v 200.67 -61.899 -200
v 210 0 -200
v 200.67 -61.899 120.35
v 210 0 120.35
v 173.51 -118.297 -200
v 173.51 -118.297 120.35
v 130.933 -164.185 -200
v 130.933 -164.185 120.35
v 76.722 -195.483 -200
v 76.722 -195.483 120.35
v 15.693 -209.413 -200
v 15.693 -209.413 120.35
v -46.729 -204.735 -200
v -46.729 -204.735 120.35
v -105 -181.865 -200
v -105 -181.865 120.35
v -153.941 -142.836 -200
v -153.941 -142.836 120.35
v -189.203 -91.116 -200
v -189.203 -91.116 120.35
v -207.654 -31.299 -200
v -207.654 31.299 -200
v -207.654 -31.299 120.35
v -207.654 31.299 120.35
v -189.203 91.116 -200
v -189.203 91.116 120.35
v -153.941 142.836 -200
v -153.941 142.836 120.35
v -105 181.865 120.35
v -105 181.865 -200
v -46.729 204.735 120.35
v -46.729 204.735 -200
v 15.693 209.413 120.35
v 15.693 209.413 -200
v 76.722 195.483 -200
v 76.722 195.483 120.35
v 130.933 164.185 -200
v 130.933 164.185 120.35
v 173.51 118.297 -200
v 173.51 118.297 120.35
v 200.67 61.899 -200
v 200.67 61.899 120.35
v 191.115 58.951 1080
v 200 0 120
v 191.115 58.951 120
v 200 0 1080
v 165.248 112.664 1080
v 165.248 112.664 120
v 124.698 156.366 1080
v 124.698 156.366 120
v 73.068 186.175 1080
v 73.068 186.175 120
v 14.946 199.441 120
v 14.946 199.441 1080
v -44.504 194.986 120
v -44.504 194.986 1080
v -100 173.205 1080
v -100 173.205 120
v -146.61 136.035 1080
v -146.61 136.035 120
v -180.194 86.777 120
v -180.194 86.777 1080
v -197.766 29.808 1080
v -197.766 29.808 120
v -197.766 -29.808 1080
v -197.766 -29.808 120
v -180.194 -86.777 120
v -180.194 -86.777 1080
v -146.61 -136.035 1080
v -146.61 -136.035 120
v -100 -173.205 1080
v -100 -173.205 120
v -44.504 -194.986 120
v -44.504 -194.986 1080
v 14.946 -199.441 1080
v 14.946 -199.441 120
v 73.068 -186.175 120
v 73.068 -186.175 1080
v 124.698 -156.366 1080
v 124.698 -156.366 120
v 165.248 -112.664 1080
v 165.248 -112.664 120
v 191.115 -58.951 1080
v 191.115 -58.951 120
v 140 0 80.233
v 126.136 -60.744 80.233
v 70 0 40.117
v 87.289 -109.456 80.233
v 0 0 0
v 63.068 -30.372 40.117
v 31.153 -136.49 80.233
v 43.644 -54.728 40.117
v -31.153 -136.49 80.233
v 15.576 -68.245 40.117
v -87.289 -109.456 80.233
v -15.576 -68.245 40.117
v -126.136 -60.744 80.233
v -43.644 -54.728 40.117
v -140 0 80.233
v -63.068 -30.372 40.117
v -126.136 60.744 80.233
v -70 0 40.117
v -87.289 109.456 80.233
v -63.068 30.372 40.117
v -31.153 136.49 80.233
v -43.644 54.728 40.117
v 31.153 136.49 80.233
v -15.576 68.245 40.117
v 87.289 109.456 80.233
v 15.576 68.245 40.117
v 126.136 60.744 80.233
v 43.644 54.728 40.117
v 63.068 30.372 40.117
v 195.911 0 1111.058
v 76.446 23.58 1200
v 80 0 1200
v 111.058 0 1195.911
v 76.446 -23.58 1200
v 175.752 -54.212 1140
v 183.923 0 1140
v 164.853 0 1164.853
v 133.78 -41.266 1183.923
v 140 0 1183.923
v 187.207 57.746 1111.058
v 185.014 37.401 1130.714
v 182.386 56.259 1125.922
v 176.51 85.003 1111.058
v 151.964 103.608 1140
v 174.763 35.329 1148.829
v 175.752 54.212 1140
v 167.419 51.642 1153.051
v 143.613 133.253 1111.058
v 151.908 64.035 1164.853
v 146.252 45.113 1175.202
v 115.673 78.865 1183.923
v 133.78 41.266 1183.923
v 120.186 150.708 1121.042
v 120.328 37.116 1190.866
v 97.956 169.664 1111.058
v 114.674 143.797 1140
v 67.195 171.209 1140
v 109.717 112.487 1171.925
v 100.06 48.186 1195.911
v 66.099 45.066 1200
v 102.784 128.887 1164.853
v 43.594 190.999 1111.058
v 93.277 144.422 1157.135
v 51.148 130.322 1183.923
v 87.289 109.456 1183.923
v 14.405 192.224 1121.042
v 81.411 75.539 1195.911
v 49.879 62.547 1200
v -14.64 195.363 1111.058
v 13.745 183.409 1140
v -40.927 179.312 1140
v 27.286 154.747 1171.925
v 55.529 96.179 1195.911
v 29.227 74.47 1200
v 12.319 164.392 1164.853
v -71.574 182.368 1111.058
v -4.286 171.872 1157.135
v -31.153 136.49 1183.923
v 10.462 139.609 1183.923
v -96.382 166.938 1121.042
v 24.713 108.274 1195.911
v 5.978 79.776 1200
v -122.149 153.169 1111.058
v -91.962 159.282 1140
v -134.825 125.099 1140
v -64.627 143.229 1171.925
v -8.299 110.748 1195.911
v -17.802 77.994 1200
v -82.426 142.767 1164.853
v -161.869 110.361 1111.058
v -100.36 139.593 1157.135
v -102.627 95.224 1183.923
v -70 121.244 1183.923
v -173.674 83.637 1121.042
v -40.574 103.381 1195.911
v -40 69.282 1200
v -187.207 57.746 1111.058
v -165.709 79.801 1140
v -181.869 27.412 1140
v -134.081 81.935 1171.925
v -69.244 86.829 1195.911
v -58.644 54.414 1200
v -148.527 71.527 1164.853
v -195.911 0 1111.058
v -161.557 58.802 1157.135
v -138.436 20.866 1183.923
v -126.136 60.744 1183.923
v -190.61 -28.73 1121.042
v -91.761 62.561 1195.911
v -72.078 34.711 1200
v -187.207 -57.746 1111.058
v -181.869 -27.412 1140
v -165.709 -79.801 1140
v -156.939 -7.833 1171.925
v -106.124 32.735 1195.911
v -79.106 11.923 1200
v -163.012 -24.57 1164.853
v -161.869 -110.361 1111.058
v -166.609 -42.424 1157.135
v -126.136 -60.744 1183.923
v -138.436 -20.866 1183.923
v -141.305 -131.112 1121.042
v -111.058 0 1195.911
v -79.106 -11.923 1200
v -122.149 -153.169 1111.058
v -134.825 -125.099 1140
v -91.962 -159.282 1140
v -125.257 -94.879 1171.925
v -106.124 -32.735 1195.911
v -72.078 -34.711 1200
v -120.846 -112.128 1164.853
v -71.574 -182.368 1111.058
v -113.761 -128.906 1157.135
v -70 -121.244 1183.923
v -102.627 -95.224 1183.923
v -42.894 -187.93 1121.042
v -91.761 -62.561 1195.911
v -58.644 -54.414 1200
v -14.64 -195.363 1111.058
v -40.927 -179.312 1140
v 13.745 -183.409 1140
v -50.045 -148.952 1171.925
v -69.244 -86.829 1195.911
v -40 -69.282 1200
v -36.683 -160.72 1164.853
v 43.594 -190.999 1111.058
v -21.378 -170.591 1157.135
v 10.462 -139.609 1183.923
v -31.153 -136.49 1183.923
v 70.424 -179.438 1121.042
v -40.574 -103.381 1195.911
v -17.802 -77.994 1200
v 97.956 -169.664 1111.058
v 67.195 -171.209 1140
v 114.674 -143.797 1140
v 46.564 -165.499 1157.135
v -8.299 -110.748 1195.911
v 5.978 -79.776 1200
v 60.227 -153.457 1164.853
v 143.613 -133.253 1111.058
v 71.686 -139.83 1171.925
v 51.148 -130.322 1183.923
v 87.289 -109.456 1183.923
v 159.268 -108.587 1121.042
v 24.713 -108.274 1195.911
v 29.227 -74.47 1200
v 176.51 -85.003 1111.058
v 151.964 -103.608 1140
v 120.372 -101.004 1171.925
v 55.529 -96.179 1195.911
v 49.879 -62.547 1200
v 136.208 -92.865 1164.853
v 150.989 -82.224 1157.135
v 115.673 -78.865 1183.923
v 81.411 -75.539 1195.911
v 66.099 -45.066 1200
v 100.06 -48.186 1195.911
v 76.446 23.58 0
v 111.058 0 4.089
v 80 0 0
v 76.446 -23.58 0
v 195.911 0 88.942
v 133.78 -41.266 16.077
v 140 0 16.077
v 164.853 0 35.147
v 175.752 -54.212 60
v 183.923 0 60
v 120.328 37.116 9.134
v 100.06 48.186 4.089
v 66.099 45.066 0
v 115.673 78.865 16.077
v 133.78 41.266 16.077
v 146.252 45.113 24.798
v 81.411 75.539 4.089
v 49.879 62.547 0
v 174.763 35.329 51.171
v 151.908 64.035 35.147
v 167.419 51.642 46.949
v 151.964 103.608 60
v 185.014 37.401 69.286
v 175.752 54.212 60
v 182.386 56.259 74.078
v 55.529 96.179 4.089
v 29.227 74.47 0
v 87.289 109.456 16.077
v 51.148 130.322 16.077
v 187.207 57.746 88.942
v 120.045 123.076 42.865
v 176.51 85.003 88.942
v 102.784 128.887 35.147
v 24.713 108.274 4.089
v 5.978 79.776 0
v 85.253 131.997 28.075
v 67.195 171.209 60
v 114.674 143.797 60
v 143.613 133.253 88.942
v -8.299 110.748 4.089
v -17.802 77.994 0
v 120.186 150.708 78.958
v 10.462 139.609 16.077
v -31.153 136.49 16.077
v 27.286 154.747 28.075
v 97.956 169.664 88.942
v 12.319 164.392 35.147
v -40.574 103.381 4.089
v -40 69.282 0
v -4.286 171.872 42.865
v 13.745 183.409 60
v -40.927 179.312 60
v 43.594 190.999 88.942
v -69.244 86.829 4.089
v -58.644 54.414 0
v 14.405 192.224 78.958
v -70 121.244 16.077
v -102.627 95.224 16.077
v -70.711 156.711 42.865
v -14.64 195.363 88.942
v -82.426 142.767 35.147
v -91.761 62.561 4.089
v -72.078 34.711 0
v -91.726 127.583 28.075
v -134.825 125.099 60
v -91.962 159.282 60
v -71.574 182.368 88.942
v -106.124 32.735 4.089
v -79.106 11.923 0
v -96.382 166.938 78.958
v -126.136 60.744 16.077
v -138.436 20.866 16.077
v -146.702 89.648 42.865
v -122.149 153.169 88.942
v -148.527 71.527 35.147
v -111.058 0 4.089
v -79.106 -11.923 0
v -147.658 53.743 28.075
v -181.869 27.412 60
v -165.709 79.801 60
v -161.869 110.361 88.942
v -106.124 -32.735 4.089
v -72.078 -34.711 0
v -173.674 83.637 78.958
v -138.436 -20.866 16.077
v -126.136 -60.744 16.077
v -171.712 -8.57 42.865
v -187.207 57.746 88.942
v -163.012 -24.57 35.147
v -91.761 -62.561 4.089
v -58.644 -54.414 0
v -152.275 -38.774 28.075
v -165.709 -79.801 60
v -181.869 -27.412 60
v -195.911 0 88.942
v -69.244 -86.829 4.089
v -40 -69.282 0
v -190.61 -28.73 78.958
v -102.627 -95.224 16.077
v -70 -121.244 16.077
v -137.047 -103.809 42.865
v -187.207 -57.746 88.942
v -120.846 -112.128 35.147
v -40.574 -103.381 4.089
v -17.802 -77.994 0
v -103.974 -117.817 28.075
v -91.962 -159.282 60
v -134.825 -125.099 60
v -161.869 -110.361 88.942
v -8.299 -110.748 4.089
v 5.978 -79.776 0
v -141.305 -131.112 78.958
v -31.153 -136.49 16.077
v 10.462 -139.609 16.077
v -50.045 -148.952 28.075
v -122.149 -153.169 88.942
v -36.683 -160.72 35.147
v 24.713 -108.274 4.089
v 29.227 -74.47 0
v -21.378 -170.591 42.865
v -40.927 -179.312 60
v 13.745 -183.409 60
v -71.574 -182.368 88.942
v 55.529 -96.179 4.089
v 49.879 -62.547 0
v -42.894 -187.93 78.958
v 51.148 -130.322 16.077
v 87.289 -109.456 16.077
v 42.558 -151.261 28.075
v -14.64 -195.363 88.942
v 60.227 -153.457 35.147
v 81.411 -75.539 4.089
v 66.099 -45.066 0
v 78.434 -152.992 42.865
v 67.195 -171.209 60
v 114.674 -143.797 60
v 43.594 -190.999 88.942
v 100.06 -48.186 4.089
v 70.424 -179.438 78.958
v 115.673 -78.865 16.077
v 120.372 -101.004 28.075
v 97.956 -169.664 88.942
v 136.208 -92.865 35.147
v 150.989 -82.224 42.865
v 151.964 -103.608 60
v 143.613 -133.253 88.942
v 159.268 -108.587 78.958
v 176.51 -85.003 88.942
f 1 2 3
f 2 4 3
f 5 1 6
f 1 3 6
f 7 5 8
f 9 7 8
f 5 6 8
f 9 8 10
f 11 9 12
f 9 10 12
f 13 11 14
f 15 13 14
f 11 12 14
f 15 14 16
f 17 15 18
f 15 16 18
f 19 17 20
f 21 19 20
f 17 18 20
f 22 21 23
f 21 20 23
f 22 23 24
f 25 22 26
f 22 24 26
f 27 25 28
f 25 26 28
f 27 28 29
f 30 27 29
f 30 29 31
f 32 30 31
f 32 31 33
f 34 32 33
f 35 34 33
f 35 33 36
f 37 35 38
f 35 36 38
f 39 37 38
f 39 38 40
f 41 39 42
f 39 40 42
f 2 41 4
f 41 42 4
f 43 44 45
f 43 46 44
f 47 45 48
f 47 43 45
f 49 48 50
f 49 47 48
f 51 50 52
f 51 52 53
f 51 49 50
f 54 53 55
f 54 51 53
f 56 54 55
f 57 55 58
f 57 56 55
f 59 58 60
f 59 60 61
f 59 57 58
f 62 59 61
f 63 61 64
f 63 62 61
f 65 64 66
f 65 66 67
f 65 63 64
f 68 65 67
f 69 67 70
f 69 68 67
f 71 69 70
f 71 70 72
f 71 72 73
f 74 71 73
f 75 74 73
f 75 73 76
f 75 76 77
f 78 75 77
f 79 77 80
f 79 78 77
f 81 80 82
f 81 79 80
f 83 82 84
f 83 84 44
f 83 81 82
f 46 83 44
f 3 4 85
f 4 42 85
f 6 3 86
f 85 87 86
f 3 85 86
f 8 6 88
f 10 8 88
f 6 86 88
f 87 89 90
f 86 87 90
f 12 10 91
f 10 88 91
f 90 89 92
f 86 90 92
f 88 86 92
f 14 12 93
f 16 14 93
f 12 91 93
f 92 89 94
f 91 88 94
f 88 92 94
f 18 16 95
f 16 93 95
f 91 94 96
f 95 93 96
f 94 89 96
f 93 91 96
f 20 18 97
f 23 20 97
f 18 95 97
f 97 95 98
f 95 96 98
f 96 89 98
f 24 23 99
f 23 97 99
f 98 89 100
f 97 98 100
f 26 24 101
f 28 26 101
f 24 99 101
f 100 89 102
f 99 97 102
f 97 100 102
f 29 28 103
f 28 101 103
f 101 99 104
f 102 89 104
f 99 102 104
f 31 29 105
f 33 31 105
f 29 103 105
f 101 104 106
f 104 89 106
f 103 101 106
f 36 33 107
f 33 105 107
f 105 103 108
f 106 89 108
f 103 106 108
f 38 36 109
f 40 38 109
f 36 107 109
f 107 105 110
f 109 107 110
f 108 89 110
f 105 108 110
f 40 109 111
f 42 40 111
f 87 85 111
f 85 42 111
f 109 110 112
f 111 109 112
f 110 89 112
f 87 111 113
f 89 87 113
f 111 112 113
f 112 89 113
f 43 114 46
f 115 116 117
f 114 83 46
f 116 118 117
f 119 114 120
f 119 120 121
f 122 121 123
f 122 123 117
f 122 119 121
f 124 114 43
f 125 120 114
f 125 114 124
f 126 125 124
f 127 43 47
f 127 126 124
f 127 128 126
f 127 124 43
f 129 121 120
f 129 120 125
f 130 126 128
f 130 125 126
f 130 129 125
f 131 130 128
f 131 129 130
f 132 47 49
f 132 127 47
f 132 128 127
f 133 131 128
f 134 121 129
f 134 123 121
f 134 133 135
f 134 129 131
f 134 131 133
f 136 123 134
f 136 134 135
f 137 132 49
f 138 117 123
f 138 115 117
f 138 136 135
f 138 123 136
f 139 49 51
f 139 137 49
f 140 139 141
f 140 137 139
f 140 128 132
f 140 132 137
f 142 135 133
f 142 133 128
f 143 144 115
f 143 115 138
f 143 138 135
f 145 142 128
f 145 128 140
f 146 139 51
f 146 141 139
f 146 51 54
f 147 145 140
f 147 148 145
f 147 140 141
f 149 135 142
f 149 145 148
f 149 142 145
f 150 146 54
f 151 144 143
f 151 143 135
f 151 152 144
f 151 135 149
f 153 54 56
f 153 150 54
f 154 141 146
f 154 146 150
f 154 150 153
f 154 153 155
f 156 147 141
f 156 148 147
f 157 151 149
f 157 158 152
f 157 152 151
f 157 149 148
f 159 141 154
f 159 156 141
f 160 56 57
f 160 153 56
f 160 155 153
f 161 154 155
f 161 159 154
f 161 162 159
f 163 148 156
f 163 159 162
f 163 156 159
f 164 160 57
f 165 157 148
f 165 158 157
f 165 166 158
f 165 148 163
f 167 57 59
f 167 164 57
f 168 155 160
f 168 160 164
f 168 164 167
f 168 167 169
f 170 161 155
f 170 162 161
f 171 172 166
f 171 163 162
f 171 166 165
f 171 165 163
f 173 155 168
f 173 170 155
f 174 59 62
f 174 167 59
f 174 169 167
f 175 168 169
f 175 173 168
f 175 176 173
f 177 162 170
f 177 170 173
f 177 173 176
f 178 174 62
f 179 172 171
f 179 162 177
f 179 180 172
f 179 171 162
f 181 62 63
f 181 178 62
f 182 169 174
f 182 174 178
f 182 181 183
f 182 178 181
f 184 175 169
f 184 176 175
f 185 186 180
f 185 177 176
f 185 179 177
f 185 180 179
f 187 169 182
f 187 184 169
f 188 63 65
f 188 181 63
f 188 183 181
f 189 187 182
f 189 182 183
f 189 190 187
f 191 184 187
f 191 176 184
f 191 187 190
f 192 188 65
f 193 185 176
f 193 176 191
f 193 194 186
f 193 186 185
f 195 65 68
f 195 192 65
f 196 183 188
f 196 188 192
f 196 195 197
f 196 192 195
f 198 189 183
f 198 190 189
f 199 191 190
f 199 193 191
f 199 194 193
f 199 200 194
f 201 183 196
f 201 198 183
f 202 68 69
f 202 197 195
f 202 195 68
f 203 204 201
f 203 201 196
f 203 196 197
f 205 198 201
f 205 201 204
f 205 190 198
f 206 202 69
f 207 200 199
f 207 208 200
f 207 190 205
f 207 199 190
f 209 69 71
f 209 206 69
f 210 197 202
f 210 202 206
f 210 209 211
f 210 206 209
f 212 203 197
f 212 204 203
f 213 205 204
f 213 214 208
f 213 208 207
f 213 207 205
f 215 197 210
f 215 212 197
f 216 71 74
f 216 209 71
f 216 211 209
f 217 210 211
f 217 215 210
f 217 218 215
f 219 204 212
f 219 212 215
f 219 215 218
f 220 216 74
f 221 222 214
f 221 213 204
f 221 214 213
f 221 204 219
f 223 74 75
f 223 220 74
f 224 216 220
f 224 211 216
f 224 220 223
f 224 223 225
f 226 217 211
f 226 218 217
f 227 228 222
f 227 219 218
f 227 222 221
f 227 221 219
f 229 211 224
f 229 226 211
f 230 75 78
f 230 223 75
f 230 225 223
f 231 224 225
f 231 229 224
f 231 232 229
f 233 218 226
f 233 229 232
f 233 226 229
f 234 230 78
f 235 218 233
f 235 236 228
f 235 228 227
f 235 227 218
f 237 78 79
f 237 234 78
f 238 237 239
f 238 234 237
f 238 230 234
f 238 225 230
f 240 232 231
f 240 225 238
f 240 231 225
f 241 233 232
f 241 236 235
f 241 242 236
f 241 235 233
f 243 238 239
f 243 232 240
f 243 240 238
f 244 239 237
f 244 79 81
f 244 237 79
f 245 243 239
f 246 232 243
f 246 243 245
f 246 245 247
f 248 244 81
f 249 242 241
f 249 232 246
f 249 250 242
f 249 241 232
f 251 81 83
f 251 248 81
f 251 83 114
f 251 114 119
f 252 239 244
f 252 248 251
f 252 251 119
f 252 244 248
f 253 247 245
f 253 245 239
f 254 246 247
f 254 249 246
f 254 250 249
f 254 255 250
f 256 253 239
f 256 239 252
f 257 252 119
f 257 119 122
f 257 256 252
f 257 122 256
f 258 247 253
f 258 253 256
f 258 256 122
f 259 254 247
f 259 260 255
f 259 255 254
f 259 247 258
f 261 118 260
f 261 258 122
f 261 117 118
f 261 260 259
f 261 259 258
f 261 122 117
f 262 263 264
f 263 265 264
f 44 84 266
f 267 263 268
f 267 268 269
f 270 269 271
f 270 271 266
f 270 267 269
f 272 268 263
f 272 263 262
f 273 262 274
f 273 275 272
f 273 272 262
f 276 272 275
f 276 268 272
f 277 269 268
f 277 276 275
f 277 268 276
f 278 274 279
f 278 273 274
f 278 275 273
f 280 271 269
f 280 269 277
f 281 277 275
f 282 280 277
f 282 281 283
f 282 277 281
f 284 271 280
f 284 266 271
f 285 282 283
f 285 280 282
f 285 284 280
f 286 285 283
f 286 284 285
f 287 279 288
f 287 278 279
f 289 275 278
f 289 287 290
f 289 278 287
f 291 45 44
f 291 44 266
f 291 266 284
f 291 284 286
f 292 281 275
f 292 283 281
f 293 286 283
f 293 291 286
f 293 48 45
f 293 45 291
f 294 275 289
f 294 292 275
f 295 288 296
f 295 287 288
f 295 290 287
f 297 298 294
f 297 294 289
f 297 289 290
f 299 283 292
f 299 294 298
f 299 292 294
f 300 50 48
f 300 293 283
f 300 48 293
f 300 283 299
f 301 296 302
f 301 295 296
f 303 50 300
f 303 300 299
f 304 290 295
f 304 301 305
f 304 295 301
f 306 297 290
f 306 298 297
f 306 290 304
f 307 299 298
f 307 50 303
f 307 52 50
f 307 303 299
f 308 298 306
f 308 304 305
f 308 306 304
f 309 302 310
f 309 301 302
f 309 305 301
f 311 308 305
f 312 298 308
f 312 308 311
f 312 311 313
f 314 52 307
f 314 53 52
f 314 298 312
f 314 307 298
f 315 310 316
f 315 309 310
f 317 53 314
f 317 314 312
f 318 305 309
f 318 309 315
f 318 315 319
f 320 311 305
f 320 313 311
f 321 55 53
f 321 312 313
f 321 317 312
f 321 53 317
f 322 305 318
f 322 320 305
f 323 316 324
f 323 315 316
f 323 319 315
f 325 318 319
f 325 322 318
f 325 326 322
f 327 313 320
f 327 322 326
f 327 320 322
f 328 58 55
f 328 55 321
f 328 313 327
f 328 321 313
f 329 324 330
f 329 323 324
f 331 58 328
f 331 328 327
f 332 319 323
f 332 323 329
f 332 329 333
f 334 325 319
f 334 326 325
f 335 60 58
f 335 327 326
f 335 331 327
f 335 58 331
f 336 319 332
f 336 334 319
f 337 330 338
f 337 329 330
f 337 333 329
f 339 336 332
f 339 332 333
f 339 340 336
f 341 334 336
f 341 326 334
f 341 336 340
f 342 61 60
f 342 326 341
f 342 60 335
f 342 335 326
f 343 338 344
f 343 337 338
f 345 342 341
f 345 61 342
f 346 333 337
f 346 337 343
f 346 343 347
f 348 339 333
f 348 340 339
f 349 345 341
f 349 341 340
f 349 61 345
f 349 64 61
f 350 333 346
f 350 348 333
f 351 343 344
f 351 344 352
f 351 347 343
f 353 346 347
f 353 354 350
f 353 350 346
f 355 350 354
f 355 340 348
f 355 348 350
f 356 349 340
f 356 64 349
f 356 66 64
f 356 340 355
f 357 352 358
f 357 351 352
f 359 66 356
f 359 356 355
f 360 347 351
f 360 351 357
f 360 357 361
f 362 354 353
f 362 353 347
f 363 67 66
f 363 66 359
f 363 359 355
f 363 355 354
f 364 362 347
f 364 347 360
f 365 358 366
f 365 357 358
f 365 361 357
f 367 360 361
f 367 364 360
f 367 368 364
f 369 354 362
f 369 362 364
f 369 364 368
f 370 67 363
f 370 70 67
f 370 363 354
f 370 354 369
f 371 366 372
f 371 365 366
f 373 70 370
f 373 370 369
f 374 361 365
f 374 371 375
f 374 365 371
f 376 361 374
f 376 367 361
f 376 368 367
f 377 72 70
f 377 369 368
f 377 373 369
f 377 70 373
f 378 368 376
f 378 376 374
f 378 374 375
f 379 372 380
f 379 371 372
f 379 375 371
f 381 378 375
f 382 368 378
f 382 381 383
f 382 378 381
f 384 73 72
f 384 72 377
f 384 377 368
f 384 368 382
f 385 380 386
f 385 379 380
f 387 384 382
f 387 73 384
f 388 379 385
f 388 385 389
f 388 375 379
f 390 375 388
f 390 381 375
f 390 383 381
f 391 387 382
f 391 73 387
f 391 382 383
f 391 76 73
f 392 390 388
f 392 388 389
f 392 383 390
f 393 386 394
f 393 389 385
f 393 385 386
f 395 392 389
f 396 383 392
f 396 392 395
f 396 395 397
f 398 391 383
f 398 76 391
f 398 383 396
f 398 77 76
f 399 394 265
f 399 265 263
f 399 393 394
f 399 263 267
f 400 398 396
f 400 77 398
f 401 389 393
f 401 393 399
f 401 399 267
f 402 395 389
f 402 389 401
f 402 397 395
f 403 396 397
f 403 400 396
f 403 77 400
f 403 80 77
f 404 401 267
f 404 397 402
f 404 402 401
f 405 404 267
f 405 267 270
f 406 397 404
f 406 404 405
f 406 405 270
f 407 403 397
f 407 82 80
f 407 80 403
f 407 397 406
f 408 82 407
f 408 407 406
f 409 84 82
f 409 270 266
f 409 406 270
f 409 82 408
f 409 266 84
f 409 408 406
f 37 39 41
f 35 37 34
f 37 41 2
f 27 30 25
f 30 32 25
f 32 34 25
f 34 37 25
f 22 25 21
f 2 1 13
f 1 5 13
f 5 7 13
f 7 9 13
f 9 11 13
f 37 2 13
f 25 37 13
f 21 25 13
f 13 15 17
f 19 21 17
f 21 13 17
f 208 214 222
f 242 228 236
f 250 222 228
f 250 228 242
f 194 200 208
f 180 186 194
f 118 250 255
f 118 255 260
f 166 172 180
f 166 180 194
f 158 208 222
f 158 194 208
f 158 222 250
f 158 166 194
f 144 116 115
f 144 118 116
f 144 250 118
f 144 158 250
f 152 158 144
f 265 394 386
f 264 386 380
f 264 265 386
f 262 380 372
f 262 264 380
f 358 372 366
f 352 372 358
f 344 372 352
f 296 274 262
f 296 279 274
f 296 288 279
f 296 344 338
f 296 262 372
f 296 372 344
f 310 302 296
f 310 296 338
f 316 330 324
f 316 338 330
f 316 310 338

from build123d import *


with BuildPart() as f1:
    # F0 (on Front) → F1 (revolve)
    with BuildSketch(Plane.XZ):
        with BuildLine():
            Line((0, 1200), (0, 0))
            Line((0, 0), (80, 0))
            ThreePointArc((80, 0), (164.852814, 35.147186), (200, 120))
            Line((200, 120), (200, 1080))
            ThreePointArc((200, 1080), (164.852814, 1164.852814), (80, 1200))
            Line((80, 1200), (0, 1200))
        make_face()
    revolve(axis=Axis((0, 0, 600), (0, 0, 1)))


with BuildPart() as f3:
    # F2 (on Front) → F3 (revolve)
    with BuildSketch(Plane.XZ):
        Polygon((210, 120.349817), (0, 0), (0, -200), (210, -200), align=None)
    revolve(axis=Axis((0, 0, -100), (0, 0, -1)))


solid = Compound([f1.part, f3.part])
